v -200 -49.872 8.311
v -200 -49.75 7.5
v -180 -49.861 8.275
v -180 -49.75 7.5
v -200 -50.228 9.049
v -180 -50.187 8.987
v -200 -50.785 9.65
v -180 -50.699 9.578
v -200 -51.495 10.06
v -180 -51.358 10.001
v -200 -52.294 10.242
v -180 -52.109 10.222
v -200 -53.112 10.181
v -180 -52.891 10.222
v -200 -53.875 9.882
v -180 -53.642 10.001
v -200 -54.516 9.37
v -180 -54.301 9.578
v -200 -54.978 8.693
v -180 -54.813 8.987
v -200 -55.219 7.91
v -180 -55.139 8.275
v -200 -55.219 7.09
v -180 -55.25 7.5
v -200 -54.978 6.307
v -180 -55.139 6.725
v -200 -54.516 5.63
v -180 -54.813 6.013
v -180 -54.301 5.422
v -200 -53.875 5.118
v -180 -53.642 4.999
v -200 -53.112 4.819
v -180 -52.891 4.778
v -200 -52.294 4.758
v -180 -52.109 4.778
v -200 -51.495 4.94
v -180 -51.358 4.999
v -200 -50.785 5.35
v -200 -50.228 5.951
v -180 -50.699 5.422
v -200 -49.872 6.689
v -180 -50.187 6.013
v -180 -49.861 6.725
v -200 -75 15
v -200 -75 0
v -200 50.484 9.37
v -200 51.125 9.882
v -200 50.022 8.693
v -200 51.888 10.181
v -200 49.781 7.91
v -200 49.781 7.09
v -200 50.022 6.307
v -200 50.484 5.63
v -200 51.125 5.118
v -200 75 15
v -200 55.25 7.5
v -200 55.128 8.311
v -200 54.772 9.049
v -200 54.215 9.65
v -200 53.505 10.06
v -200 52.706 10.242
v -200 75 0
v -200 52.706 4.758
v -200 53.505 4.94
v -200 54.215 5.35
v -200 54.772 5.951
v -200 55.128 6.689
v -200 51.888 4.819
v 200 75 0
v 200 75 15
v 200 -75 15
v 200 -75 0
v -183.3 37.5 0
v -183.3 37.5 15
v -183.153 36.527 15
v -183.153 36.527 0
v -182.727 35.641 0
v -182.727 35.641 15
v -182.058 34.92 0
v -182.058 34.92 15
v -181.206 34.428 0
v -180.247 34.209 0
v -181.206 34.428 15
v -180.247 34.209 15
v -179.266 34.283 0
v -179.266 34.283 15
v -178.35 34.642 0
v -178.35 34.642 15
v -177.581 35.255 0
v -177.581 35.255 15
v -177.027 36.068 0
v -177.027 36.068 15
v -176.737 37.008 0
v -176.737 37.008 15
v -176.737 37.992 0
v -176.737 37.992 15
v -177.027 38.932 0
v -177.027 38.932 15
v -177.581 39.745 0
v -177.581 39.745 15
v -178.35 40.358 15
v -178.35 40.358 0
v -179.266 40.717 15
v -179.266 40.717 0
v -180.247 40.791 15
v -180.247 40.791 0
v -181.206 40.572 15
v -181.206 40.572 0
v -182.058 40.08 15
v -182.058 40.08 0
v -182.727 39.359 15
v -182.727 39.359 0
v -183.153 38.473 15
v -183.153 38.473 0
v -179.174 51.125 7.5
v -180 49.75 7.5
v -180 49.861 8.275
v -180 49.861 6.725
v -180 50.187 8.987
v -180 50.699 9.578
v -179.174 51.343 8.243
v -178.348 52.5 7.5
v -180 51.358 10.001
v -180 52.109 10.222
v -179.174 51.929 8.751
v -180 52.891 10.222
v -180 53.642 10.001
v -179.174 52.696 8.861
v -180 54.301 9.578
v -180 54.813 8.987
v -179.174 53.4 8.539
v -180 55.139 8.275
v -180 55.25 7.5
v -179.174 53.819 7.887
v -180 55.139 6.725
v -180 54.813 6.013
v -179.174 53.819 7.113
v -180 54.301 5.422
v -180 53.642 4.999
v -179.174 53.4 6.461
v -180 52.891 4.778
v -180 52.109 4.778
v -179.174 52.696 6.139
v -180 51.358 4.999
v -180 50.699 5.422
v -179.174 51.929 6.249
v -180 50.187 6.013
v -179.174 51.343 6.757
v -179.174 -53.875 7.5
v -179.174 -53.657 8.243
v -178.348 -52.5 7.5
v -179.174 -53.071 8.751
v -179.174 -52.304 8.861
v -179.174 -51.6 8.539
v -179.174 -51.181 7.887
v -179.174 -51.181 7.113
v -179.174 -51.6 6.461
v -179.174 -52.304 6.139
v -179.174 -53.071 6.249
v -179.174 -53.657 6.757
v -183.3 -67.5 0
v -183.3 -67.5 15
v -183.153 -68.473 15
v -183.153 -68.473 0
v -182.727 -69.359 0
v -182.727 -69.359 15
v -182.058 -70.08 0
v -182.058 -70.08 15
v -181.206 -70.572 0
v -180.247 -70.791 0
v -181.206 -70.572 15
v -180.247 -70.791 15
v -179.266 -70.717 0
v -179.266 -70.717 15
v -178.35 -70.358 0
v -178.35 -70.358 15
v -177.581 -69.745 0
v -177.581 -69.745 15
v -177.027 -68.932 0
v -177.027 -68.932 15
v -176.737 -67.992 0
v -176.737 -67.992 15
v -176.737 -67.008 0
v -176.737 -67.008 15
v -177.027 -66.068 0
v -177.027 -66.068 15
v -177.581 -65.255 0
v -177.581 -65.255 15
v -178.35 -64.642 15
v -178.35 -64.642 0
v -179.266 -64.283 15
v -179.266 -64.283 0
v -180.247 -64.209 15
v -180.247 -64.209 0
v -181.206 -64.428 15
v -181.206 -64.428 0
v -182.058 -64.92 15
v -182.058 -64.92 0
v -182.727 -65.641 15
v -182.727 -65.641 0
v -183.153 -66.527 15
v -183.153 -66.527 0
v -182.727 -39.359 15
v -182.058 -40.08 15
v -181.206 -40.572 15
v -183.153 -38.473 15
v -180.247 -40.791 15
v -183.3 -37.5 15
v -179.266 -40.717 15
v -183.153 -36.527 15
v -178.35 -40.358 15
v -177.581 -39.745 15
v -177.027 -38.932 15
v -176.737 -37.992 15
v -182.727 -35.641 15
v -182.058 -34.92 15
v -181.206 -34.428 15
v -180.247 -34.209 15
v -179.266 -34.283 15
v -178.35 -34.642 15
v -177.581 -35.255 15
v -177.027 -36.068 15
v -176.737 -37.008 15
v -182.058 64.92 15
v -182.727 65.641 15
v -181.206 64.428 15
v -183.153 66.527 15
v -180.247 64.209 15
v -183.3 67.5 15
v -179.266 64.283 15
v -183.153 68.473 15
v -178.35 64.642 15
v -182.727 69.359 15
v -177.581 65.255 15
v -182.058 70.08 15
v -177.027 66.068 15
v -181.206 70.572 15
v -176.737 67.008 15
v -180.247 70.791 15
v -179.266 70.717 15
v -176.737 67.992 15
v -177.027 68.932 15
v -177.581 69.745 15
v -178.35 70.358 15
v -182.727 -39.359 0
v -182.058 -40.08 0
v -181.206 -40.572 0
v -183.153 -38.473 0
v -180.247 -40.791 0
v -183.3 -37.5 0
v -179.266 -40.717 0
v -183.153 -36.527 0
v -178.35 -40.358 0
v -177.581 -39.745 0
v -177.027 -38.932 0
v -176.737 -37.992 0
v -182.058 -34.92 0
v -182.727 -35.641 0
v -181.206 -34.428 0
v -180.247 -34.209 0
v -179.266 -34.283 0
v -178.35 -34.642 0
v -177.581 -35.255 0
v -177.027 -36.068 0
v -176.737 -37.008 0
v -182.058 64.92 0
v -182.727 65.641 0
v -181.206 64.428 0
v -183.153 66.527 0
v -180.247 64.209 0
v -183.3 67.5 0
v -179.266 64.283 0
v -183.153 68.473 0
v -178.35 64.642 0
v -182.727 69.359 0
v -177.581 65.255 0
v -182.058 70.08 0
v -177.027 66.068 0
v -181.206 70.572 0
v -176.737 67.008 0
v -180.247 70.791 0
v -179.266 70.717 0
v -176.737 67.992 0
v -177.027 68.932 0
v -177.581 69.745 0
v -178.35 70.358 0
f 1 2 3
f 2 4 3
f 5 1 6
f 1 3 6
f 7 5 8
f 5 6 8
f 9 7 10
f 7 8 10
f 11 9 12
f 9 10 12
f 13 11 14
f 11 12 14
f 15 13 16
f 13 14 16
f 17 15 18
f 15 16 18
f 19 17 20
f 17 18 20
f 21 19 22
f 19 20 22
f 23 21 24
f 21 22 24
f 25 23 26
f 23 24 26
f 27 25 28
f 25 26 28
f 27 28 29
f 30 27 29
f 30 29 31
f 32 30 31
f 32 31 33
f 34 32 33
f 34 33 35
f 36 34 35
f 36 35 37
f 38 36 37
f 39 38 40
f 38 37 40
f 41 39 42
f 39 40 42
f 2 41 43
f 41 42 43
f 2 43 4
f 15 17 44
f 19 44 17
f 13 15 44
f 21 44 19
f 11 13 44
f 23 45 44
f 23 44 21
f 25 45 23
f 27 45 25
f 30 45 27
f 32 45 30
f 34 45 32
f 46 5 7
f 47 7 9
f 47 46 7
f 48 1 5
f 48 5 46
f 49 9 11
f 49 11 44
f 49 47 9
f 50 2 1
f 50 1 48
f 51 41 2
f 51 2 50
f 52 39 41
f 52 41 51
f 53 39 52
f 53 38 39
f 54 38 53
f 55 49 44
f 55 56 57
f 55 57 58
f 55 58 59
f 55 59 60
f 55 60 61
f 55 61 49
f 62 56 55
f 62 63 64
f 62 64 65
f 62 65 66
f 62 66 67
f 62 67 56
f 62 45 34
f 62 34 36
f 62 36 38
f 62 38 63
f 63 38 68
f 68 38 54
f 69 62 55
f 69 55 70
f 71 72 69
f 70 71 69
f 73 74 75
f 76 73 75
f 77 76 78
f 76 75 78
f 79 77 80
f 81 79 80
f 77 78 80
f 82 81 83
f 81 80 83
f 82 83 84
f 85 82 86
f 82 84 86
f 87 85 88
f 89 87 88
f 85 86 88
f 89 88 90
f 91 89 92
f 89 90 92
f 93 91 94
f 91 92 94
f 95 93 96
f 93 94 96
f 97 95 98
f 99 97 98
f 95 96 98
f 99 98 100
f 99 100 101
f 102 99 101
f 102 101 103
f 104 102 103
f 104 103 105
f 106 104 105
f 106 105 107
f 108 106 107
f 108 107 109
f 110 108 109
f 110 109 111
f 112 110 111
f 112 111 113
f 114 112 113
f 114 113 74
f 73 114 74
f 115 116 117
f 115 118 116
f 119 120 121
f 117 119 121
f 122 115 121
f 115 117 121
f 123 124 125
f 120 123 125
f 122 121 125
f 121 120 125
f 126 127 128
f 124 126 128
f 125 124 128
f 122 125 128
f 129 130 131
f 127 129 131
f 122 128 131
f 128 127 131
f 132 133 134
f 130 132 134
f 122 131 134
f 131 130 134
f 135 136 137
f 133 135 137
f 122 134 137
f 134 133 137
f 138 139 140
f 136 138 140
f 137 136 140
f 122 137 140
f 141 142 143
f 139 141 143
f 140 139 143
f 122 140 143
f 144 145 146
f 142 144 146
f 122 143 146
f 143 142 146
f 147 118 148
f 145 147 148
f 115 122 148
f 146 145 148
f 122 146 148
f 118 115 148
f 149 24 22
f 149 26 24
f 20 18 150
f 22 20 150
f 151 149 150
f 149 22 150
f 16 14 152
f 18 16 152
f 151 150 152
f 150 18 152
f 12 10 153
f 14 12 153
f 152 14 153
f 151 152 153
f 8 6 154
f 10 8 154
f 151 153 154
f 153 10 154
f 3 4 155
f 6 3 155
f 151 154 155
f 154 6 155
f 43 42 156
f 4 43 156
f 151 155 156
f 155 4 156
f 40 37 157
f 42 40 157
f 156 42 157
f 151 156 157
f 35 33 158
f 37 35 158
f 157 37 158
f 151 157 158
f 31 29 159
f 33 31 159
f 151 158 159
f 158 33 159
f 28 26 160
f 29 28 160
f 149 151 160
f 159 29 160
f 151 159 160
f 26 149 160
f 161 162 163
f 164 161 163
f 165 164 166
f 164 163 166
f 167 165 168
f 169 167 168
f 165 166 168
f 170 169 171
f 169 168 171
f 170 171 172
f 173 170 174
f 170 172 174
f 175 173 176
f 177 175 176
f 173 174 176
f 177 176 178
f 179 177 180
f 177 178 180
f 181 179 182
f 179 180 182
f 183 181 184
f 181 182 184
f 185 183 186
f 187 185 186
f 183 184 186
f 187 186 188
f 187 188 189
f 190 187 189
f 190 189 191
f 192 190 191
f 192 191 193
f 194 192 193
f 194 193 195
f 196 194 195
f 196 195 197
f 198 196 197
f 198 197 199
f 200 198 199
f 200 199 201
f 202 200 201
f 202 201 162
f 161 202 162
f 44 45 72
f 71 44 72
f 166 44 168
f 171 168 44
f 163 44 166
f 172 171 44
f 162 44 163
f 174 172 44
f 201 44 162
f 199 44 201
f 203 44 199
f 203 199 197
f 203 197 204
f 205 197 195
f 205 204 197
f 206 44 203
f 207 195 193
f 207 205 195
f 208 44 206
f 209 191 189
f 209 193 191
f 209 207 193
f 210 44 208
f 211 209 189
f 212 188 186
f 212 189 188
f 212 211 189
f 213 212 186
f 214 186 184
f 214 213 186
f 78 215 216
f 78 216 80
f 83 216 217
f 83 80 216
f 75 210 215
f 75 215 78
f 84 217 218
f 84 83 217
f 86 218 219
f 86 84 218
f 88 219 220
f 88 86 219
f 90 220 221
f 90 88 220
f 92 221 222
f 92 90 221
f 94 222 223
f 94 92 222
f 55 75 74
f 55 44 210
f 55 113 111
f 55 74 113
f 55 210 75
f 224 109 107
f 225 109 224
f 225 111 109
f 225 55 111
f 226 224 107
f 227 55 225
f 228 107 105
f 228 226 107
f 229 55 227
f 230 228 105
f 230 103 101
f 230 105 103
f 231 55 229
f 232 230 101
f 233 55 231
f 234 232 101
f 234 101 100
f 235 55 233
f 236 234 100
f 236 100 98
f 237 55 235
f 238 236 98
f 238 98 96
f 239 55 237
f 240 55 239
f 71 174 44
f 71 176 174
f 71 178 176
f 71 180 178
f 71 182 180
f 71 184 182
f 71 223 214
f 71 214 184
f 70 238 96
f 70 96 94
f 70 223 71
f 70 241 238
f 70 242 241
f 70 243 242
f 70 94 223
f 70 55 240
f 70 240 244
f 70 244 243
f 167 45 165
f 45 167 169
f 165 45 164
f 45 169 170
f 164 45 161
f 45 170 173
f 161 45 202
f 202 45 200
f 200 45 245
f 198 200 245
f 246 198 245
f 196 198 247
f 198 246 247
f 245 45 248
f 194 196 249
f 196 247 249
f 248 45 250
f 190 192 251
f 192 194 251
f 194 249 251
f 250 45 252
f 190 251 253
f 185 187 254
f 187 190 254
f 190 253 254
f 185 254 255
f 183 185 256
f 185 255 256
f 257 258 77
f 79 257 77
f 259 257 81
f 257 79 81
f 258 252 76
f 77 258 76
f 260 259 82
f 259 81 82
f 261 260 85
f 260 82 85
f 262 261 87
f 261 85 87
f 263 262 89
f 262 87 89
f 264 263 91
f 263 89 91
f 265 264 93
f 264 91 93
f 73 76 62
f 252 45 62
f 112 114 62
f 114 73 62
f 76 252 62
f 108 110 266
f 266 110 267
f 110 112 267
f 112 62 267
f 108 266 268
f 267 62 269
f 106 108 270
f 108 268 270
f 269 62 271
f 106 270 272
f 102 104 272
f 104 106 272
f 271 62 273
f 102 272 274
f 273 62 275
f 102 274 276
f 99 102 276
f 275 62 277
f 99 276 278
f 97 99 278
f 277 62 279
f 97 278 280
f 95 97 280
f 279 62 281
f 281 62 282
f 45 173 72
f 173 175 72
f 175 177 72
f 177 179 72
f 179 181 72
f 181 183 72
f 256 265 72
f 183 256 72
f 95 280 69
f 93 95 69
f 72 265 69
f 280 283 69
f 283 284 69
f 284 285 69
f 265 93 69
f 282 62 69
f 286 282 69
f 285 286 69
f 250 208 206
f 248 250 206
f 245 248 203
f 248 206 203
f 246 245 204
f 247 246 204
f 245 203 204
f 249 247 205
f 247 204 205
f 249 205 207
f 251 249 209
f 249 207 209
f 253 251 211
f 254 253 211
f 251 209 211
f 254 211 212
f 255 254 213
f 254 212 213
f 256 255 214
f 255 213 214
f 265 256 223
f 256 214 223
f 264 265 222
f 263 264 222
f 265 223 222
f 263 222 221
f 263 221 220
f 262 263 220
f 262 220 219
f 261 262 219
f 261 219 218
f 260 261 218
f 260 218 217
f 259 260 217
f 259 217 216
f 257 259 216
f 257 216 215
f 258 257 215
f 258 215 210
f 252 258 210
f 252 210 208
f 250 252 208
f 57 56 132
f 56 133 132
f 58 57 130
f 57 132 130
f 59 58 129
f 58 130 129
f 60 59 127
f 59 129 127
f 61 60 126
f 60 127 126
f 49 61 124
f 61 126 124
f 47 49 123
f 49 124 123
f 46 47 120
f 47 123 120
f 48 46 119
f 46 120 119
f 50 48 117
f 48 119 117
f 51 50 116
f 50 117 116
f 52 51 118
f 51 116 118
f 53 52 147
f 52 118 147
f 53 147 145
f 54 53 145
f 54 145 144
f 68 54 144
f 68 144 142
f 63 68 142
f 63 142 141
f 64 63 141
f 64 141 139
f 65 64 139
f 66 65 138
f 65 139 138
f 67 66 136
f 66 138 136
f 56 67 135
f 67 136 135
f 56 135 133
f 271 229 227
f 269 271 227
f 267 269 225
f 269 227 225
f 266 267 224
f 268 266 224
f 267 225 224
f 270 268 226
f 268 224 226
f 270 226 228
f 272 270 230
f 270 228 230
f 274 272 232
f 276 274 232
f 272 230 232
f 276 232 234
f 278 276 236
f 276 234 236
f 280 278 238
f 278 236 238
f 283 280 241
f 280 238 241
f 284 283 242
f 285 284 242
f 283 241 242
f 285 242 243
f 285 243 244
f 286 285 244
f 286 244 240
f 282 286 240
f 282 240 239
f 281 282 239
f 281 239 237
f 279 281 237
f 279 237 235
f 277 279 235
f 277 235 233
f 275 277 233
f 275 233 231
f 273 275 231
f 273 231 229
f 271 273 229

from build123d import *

# Parameters (mm, degrees)
F0_W     = 400
F0_H     = 150
F1_DEPTH = 15
F2_D     = 6.6
F4_D     = 5.5
F4_DEPTH = 20
F4_TIP   = 1.6523667023


with BuildPart() as f1:
    # F0 (on Top) → F1 (new body)
    with BuildSketch(Plane.XY):
        Rectangle(F0_W, F0_H)
    extrude(amount=F1_DEPTH)

    # F2 (through all)
    with Locations(Plane(origin=(0, 0, 0), x_dir=(1, 0, 0), z_dir=(0, 0, -1))):
        with Locations((-180, -37.5), (-180, -67.5), (-180, 37.5), (-180, 67.5)):
            Hole(F2_D / 2)

    # F4
    with Locations(Plane(origin=(-200, 0, 0), x_dir=(0, -1, 0), z_dir=(-1, 0, 0))):
        with Locations((-52.5, 7.5), (52.5, 7.5)):
            Hole(F4_D / 2, depth=F4_DEPTH)
            with Locations((0, 0, -(F4_DEPTH + F4_TIP / 2))):  # 118° drill point
                Cone(0, F4_D / 2, F4_TIP, mode=Mode.SUBTRACT)


solid = f1.part
